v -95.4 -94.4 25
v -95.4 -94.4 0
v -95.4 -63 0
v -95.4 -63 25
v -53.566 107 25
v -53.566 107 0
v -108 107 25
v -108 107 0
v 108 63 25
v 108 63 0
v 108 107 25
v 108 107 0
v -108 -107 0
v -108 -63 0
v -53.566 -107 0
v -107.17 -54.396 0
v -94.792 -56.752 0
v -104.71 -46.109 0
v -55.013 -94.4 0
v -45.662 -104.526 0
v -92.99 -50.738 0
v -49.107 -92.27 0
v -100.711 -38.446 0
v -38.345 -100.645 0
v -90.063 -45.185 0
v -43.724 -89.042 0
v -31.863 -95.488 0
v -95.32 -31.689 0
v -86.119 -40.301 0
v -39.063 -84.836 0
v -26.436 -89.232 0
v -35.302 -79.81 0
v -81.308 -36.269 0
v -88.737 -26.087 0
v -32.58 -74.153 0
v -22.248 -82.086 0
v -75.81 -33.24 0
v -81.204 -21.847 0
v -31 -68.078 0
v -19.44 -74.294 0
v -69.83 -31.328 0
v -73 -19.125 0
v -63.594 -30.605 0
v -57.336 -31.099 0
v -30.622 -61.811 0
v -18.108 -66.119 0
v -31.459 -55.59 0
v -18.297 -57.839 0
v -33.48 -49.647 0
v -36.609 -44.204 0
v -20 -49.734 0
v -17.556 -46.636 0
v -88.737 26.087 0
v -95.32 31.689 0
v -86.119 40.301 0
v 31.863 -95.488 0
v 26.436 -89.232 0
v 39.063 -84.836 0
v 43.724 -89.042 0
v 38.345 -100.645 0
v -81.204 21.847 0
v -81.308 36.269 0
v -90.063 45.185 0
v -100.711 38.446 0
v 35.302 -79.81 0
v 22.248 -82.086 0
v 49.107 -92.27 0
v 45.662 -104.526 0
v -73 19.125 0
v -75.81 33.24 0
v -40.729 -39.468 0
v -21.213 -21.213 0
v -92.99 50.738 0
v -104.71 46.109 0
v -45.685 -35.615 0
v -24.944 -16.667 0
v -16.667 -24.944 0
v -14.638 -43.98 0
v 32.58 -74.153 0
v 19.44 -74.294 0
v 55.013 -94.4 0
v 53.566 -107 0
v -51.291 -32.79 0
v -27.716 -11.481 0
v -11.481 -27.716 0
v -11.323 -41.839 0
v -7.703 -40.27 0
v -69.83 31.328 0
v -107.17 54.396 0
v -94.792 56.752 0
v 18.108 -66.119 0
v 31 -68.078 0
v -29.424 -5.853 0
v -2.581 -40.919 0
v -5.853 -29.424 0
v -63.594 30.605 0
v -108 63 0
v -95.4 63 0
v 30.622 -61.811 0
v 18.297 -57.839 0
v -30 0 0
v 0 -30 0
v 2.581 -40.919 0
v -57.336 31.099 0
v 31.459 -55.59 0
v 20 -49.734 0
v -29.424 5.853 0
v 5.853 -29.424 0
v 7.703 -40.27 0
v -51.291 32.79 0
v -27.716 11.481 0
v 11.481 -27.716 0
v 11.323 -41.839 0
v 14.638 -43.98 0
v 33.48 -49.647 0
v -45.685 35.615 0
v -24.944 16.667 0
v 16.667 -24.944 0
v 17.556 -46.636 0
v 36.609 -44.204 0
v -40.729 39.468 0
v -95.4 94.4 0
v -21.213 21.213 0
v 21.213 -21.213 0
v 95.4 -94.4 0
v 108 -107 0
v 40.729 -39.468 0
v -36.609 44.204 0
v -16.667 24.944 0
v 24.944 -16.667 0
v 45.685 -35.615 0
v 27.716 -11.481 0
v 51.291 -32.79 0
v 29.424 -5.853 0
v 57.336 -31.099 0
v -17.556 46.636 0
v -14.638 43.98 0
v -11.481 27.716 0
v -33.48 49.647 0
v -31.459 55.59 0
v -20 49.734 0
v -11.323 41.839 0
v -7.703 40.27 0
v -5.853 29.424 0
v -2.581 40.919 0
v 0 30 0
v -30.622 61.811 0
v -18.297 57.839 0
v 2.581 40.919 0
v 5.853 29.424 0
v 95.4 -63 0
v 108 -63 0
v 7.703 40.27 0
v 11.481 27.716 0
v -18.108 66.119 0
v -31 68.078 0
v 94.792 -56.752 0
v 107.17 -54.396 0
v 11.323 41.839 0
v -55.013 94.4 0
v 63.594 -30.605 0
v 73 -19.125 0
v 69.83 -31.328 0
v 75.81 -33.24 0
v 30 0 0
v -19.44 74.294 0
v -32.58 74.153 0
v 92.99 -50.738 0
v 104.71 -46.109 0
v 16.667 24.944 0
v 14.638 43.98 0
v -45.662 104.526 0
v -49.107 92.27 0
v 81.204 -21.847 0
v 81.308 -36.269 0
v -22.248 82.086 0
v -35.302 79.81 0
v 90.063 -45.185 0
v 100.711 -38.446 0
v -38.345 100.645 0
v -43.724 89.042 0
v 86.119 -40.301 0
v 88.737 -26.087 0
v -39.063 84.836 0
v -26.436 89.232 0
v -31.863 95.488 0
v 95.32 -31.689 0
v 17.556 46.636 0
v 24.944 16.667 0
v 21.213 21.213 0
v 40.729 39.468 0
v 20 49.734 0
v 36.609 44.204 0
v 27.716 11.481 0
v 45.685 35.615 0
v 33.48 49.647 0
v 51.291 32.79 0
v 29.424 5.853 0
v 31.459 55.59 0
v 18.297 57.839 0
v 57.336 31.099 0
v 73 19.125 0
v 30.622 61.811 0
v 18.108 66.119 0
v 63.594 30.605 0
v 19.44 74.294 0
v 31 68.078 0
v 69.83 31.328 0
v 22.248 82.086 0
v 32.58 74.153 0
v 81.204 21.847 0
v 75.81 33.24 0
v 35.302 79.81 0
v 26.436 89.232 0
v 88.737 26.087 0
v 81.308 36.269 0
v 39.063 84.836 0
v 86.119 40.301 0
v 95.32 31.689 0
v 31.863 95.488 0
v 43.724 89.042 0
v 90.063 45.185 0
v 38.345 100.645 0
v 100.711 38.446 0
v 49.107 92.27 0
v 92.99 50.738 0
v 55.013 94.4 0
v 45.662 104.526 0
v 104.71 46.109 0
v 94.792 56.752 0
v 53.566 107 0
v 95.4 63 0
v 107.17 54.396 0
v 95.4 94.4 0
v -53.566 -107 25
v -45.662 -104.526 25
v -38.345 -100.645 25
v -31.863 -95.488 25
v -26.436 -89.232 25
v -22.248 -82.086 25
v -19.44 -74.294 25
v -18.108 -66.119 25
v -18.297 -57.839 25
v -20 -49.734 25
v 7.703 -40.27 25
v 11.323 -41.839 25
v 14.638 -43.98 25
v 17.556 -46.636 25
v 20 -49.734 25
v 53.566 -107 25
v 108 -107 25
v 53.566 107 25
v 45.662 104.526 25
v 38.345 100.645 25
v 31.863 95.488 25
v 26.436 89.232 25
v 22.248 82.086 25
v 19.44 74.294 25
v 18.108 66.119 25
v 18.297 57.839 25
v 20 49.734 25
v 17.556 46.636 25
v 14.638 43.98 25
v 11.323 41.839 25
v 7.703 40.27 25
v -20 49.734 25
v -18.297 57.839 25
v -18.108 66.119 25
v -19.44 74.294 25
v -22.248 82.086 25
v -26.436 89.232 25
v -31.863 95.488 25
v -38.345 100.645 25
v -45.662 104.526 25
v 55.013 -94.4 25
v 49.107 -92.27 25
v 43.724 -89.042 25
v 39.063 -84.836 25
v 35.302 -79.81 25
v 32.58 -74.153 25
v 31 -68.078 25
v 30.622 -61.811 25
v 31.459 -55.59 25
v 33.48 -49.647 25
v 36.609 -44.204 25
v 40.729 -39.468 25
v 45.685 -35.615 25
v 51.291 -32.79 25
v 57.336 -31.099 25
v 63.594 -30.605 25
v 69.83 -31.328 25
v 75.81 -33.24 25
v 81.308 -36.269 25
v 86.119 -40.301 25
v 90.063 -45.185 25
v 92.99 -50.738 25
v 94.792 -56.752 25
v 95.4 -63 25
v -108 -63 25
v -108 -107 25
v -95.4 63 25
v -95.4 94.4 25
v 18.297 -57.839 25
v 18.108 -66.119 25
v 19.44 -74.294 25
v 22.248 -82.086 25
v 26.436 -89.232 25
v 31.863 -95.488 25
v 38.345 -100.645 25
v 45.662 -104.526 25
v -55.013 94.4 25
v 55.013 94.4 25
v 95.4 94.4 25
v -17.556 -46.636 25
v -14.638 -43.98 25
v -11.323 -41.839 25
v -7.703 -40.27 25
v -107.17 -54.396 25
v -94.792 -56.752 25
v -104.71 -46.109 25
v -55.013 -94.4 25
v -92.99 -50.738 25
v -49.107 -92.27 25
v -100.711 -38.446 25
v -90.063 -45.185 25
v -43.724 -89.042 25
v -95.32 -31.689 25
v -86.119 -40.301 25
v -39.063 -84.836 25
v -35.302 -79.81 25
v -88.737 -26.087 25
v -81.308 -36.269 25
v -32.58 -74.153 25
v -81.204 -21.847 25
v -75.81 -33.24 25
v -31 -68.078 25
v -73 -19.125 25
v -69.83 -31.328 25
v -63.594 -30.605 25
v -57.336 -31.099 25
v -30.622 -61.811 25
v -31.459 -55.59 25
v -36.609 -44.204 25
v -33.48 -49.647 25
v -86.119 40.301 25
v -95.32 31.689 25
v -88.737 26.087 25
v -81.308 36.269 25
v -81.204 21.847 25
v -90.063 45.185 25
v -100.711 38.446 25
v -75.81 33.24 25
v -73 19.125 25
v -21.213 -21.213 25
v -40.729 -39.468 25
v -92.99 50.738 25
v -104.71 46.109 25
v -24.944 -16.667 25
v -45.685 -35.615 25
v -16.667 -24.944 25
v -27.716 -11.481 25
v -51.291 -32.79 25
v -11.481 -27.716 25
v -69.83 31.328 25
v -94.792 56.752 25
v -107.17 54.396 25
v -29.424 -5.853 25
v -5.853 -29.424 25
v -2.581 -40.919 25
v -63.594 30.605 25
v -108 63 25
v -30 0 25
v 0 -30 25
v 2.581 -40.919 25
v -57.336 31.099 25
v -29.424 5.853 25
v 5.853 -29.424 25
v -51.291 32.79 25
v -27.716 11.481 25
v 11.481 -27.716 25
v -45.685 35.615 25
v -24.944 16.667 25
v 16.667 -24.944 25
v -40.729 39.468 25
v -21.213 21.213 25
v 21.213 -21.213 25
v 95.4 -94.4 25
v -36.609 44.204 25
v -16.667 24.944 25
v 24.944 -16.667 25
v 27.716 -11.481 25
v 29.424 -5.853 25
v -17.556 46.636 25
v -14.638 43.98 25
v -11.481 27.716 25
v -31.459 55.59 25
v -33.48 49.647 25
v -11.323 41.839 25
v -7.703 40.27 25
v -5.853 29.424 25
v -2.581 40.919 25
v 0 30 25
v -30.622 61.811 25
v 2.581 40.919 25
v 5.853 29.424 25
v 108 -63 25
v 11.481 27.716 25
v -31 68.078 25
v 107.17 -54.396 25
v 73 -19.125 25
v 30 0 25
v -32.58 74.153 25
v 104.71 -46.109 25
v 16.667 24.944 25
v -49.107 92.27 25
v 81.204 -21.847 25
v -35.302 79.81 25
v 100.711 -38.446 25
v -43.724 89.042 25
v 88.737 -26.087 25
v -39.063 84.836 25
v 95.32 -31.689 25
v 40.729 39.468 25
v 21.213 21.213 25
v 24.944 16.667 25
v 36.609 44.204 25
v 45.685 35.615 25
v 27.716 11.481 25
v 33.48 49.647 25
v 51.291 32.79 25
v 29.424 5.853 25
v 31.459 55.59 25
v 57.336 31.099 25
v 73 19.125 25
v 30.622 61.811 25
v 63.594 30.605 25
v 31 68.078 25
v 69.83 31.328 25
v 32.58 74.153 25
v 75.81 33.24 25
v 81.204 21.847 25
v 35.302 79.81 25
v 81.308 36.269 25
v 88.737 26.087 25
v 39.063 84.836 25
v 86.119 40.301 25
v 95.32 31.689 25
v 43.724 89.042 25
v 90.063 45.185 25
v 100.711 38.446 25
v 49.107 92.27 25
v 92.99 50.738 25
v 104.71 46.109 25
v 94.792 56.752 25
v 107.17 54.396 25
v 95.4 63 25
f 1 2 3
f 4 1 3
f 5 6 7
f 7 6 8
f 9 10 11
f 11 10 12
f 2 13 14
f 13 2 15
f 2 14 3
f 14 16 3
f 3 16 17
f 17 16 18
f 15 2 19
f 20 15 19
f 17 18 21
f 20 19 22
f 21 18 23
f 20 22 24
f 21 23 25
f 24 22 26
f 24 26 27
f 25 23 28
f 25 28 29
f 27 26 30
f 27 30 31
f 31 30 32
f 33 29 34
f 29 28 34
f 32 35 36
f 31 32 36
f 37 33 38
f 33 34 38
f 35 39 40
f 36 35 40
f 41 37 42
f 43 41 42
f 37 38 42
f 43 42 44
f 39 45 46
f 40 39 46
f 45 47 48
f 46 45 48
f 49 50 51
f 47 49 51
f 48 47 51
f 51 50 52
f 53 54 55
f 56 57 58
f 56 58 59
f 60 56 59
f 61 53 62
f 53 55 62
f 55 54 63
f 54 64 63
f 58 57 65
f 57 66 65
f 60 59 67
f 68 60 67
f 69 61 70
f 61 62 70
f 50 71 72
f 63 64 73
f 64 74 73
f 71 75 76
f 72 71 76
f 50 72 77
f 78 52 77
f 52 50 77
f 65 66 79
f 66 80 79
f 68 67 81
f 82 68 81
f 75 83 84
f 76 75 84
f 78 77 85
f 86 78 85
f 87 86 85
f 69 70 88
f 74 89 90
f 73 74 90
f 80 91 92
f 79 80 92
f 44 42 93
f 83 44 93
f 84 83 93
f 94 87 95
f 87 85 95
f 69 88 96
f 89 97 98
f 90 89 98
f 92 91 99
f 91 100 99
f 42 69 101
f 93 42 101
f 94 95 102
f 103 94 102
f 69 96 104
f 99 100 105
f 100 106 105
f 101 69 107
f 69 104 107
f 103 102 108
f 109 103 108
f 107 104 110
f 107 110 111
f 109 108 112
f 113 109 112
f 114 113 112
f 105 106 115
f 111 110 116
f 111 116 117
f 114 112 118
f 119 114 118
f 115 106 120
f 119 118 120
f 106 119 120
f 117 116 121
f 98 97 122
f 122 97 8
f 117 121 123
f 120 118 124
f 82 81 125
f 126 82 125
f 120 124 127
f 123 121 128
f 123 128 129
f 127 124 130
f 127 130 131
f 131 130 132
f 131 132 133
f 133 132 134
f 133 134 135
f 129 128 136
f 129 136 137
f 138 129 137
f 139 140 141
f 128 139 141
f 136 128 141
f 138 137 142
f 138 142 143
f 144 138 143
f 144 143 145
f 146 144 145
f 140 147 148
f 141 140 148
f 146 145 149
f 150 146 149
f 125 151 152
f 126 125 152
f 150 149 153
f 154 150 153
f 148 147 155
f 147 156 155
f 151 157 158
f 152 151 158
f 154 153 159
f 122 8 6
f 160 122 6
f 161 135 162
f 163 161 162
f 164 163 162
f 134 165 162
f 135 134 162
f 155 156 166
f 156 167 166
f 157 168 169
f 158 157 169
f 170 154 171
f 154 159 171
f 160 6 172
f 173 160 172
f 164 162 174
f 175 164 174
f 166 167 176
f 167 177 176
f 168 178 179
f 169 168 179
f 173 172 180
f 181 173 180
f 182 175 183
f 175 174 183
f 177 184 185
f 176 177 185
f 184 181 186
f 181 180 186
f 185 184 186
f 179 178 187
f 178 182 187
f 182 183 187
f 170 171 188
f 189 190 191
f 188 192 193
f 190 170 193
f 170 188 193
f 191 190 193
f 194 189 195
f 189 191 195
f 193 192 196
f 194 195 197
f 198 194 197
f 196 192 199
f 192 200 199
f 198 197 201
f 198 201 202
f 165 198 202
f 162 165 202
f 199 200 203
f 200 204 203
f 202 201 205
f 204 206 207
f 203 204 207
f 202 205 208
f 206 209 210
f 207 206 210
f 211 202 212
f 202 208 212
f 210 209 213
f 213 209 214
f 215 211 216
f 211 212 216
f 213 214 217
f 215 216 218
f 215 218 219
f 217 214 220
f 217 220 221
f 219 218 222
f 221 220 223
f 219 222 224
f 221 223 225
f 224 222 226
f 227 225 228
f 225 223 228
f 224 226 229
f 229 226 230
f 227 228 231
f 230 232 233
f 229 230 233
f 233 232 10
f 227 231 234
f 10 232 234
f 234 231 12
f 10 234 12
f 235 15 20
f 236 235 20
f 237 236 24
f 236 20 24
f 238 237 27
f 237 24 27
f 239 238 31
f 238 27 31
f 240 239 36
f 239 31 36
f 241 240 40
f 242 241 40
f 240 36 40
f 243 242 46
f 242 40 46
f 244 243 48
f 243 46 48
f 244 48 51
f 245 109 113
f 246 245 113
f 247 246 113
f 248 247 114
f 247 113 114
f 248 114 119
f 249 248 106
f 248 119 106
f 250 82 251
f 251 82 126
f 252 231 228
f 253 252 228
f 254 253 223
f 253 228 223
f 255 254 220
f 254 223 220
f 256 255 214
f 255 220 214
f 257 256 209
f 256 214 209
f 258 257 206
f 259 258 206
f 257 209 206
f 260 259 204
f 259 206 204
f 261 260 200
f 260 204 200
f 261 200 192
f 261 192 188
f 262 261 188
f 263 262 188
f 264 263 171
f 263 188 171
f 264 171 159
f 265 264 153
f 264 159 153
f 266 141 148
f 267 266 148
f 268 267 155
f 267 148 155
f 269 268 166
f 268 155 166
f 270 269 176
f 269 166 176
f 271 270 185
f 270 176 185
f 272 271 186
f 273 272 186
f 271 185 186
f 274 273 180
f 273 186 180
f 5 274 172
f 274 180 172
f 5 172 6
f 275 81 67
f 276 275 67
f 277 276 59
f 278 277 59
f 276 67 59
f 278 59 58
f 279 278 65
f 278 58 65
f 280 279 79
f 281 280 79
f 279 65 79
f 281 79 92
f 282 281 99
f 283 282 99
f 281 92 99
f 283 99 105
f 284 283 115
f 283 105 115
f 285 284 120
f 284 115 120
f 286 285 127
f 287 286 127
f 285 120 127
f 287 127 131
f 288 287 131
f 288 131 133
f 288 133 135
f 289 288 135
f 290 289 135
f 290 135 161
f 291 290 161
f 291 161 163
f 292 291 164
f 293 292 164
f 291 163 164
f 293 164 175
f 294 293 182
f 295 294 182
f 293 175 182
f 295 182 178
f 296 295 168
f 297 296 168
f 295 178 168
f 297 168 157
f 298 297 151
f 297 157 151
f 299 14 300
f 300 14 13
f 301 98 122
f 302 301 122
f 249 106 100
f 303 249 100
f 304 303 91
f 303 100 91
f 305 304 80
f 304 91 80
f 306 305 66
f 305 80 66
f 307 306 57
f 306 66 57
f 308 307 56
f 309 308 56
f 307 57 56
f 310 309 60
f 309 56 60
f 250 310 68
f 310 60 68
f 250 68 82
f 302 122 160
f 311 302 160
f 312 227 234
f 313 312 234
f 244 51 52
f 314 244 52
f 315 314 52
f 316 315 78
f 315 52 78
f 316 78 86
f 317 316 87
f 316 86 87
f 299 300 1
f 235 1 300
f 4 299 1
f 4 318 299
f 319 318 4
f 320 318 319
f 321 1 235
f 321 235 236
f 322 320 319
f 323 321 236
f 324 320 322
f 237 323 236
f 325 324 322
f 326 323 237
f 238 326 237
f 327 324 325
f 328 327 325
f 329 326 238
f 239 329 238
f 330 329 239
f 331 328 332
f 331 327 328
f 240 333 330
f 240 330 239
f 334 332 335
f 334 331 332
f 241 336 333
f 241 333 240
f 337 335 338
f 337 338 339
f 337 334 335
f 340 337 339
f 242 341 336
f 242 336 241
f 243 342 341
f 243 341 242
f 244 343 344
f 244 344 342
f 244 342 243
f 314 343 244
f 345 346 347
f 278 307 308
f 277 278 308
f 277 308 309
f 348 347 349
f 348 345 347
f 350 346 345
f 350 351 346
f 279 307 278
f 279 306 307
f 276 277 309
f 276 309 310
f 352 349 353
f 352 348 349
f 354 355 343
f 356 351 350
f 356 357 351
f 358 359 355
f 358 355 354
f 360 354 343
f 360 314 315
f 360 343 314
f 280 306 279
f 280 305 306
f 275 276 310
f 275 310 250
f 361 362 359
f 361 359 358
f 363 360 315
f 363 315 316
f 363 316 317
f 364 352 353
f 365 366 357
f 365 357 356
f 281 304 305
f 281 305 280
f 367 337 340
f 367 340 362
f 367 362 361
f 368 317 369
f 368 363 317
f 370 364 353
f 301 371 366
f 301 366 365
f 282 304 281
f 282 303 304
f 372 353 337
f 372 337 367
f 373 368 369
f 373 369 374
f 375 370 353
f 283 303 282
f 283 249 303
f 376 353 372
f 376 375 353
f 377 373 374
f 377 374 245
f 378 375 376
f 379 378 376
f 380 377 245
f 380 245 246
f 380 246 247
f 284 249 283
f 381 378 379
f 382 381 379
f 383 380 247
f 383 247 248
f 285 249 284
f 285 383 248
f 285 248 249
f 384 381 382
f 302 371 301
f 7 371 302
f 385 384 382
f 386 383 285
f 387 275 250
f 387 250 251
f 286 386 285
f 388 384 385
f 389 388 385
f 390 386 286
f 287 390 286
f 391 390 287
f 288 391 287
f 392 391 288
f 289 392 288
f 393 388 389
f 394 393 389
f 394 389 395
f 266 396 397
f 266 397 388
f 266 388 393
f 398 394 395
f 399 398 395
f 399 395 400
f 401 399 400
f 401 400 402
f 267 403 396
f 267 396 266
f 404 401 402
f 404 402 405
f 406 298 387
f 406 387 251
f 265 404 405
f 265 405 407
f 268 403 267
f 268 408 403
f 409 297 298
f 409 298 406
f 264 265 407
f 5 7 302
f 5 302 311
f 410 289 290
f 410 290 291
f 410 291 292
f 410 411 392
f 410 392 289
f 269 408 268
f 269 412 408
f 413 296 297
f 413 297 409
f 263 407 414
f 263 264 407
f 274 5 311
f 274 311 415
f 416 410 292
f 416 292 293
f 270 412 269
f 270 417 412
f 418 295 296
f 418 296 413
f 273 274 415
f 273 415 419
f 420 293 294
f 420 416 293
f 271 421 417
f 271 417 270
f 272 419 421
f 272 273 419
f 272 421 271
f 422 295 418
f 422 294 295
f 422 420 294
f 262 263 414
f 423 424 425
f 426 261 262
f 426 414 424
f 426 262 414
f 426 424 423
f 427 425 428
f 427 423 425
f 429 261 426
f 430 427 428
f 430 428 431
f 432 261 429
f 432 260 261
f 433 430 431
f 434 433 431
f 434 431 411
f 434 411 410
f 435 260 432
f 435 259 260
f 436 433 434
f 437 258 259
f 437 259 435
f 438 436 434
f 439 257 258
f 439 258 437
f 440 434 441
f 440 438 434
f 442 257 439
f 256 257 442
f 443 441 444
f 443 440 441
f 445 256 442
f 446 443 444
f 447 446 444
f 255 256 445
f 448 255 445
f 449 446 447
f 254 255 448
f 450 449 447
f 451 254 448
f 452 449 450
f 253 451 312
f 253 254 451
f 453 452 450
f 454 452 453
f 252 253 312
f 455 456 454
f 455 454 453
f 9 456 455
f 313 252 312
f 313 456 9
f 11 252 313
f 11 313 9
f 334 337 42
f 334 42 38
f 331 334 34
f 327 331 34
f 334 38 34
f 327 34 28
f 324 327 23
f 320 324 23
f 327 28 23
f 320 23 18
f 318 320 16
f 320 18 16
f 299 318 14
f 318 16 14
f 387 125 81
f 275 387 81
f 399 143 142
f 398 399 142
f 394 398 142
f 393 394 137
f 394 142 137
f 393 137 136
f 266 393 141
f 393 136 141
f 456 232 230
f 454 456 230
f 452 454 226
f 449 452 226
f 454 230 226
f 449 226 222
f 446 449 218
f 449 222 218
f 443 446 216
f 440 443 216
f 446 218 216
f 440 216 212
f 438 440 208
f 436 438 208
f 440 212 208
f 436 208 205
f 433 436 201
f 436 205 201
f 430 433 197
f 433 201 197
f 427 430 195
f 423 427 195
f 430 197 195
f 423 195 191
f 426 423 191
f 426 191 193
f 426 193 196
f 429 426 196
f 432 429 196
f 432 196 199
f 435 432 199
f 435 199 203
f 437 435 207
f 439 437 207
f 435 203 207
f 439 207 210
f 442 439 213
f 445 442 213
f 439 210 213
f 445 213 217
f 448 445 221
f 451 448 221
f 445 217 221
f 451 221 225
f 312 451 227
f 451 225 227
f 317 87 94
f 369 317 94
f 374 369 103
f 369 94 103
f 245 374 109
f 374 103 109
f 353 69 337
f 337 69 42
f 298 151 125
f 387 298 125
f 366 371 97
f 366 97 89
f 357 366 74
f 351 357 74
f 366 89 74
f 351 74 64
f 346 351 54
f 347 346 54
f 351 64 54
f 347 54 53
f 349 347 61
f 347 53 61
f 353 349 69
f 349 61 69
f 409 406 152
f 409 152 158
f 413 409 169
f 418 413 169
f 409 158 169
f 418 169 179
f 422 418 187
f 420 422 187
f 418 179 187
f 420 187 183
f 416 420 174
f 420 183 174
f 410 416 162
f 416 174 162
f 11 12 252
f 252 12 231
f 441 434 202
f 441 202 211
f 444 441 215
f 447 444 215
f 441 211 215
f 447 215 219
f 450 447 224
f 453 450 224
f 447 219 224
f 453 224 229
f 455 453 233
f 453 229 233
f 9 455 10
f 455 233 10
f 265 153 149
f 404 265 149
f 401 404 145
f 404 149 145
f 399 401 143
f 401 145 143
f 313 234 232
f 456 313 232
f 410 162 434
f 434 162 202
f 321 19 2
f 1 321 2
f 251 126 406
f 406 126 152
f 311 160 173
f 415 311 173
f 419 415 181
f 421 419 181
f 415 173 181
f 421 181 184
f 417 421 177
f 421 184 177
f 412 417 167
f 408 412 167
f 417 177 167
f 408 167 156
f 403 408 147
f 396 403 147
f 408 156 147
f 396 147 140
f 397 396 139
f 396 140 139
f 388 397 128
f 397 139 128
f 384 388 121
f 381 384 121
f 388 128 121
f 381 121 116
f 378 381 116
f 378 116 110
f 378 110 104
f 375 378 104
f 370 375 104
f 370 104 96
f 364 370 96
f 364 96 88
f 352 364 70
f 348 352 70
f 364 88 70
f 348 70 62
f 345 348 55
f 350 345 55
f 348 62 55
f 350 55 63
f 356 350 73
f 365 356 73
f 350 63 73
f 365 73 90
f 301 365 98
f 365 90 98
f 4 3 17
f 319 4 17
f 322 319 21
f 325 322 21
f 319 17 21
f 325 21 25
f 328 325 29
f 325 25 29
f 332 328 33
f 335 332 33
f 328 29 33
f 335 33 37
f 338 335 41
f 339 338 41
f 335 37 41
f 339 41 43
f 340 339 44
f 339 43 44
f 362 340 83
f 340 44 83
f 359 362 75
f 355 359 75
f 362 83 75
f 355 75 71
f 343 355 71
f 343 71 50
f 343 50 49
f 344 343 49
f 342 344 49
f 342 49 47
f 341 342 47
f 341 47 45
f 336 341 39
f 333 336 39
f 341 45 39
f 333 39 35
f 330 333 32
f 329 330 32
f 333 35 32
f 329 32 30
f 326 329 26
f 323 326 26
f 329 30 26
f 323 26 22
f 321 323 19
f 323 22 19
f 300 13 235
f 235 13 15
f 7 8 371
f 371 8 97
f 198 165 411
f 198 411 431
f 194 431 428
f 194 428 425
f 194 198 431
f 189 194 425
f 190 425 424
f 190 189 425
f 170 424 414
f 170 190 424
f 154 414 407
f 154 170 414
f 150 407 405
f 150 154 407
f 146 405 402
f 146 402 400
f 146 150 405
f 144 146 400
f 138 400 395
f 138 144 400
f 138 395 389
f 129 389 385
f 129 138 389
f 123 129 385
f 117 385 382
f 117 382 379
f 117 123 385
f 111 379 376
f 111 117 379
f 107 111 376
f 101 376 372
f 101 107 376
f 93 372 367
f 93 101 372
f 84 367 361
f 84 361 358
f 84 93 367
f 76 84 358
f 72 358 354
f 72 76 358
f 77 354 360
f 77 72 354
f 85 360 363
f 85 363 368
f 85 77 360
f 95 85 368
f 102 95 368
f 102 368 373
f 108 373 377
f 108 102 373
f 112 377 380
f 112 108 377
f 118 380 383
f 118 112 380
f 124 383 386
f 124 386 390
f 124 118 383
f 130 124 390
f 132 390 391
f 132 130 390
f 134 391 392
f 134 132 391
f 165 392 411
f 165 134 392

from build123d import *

# Parameters (mm, degrees)
SKETCH1_R           = 30
BOSS_EXTRUDE1_DEPTH = 25


with BuildPart() as part:
    # Sketch1 → Boss-Extrude1 (new body)
    with BuildSketch(Plane.XY):
        with BuildLine():
            ThreePointArc((73, 19.125178063), (98.178118199, 34.937569599), (108, 63))
            Line((108, 63), (108, 107))
            Line((108, 107), (53.566018868, 107))
            ThreePointArc((53.566018868, 107), (24.177408949, 85.755360338), (20, 49.733500839))
            ThreePointArc((20, 49.733500839), (14.637539739, 43.980472393), (7.703238546, 40.26984127))
            ThreePointArc((7.703238546, 40.26984127), (0, 41), (-7.703238546, 40.26984127))
            ThreePointArc((-7.703238546, 40.26984127), (-14.637539739, 43.980472393), (-20, 49.733500839))
            ThreePointArc((-20, 49.733500839), (-24.177408949, 85.755360338), (-53.566018868, 107))
            Line((-53.566018868, 107), (-108, 107))
            Line((-108, 107), (-108, 63))
            ThreePointArc((-108, 63), (-98.178118199, 34.937569599), (-73, 19.125178063))
            Line((-73, 19.125178063), (-73, -19.125178063))
            ThreePointArc((-73, -19.125178063), (-98.178118199, -34.937569599), (-108, -63))
            Line((-108, -63), (-108, -107))
            Line((-108, -107), (-53.566018868, -107))
            ThreePointArc((-53.566018868, -107), (-24.177408949, -85.755360338), (-20, -49.733500839))
            ThreePointArc((-20, -49.733500839), (-14.637539739, -43.980472393), (-7.703238546, -40.26984127))
            ThreePointArc((-7.703238546, -40.26984127), (0, -41), (7.703238546, -40.26984127))
            ThreePointArc((7.703238546, -40.26984127), (14.637539739, -43.980472393), (20, -49.733500839))
            ThreePointArc((20, -49.733500839), (24.177408949, -85.755360338), (53.566018868, -107))
            Line((53.566018868, -107), (108, -107))
            Line((108, -107), (108, -63))
            ThreePointArc((108, -63), (98.178118199, -34.937569599), (73, -19.125178063))
            Line((73, -19.125178063), (73, 19.125178063))
        make_face()
        with BuildLine():
            Line((95.4, -63), (95.4, -94.4))
            Line((95.4, -94.4), (55.012509781, -94.4))
            ThreePointArc((55.012509781, -94.4), (43.113254202, -37.421154413), (95.4, -63))
        make_face(mode=Mode.SUBTRACT)
        with BuildLine():
            ThreePointArc((-55.012509781, 94.4), (-43.113254202, 37.421154413), (-95.4, 63))
            Line((-95.4, 63), (-95.4, 65.547547841))
            Line((-95.4, 65.547547841), (-95.4, 94.4))
            Line((-95.4, 94.4), (-55.012509781, 94.4))
        make_face(mode=Mode.SUBTRACT)
        Circle(SKETCH1_R, mode=Mode.SUBTRACT)
        with BuildLine():
            Line((55.012509781, 94.4), (95.4, 94.4))
            Line((95.4, 94.4), (95.4, 65.547547841))
            Line((95.4, 65.547547841), (95.4, 63))
            ThreePointArc((95.4, 63), (43.113254202, 37.421154413), (55.012509781, 94.4))
        make_face(mode=Mode.SUBTRACT)
        with BuildLine():
            Line((-95.4, -94.4), (-95.4, -63))
            ThreePointArc((-95.4, -63), (-43.113254202, -37.421154413), (-55.012509781, -94.4))
            Line((-55.012509781, -94.4), (-95.4, -94.4))
        make_face(mode=Mode.SUBTRACT)
    extrude(amount=BOSS_EXTRUDE1_DEPTH)


solid = part.part
